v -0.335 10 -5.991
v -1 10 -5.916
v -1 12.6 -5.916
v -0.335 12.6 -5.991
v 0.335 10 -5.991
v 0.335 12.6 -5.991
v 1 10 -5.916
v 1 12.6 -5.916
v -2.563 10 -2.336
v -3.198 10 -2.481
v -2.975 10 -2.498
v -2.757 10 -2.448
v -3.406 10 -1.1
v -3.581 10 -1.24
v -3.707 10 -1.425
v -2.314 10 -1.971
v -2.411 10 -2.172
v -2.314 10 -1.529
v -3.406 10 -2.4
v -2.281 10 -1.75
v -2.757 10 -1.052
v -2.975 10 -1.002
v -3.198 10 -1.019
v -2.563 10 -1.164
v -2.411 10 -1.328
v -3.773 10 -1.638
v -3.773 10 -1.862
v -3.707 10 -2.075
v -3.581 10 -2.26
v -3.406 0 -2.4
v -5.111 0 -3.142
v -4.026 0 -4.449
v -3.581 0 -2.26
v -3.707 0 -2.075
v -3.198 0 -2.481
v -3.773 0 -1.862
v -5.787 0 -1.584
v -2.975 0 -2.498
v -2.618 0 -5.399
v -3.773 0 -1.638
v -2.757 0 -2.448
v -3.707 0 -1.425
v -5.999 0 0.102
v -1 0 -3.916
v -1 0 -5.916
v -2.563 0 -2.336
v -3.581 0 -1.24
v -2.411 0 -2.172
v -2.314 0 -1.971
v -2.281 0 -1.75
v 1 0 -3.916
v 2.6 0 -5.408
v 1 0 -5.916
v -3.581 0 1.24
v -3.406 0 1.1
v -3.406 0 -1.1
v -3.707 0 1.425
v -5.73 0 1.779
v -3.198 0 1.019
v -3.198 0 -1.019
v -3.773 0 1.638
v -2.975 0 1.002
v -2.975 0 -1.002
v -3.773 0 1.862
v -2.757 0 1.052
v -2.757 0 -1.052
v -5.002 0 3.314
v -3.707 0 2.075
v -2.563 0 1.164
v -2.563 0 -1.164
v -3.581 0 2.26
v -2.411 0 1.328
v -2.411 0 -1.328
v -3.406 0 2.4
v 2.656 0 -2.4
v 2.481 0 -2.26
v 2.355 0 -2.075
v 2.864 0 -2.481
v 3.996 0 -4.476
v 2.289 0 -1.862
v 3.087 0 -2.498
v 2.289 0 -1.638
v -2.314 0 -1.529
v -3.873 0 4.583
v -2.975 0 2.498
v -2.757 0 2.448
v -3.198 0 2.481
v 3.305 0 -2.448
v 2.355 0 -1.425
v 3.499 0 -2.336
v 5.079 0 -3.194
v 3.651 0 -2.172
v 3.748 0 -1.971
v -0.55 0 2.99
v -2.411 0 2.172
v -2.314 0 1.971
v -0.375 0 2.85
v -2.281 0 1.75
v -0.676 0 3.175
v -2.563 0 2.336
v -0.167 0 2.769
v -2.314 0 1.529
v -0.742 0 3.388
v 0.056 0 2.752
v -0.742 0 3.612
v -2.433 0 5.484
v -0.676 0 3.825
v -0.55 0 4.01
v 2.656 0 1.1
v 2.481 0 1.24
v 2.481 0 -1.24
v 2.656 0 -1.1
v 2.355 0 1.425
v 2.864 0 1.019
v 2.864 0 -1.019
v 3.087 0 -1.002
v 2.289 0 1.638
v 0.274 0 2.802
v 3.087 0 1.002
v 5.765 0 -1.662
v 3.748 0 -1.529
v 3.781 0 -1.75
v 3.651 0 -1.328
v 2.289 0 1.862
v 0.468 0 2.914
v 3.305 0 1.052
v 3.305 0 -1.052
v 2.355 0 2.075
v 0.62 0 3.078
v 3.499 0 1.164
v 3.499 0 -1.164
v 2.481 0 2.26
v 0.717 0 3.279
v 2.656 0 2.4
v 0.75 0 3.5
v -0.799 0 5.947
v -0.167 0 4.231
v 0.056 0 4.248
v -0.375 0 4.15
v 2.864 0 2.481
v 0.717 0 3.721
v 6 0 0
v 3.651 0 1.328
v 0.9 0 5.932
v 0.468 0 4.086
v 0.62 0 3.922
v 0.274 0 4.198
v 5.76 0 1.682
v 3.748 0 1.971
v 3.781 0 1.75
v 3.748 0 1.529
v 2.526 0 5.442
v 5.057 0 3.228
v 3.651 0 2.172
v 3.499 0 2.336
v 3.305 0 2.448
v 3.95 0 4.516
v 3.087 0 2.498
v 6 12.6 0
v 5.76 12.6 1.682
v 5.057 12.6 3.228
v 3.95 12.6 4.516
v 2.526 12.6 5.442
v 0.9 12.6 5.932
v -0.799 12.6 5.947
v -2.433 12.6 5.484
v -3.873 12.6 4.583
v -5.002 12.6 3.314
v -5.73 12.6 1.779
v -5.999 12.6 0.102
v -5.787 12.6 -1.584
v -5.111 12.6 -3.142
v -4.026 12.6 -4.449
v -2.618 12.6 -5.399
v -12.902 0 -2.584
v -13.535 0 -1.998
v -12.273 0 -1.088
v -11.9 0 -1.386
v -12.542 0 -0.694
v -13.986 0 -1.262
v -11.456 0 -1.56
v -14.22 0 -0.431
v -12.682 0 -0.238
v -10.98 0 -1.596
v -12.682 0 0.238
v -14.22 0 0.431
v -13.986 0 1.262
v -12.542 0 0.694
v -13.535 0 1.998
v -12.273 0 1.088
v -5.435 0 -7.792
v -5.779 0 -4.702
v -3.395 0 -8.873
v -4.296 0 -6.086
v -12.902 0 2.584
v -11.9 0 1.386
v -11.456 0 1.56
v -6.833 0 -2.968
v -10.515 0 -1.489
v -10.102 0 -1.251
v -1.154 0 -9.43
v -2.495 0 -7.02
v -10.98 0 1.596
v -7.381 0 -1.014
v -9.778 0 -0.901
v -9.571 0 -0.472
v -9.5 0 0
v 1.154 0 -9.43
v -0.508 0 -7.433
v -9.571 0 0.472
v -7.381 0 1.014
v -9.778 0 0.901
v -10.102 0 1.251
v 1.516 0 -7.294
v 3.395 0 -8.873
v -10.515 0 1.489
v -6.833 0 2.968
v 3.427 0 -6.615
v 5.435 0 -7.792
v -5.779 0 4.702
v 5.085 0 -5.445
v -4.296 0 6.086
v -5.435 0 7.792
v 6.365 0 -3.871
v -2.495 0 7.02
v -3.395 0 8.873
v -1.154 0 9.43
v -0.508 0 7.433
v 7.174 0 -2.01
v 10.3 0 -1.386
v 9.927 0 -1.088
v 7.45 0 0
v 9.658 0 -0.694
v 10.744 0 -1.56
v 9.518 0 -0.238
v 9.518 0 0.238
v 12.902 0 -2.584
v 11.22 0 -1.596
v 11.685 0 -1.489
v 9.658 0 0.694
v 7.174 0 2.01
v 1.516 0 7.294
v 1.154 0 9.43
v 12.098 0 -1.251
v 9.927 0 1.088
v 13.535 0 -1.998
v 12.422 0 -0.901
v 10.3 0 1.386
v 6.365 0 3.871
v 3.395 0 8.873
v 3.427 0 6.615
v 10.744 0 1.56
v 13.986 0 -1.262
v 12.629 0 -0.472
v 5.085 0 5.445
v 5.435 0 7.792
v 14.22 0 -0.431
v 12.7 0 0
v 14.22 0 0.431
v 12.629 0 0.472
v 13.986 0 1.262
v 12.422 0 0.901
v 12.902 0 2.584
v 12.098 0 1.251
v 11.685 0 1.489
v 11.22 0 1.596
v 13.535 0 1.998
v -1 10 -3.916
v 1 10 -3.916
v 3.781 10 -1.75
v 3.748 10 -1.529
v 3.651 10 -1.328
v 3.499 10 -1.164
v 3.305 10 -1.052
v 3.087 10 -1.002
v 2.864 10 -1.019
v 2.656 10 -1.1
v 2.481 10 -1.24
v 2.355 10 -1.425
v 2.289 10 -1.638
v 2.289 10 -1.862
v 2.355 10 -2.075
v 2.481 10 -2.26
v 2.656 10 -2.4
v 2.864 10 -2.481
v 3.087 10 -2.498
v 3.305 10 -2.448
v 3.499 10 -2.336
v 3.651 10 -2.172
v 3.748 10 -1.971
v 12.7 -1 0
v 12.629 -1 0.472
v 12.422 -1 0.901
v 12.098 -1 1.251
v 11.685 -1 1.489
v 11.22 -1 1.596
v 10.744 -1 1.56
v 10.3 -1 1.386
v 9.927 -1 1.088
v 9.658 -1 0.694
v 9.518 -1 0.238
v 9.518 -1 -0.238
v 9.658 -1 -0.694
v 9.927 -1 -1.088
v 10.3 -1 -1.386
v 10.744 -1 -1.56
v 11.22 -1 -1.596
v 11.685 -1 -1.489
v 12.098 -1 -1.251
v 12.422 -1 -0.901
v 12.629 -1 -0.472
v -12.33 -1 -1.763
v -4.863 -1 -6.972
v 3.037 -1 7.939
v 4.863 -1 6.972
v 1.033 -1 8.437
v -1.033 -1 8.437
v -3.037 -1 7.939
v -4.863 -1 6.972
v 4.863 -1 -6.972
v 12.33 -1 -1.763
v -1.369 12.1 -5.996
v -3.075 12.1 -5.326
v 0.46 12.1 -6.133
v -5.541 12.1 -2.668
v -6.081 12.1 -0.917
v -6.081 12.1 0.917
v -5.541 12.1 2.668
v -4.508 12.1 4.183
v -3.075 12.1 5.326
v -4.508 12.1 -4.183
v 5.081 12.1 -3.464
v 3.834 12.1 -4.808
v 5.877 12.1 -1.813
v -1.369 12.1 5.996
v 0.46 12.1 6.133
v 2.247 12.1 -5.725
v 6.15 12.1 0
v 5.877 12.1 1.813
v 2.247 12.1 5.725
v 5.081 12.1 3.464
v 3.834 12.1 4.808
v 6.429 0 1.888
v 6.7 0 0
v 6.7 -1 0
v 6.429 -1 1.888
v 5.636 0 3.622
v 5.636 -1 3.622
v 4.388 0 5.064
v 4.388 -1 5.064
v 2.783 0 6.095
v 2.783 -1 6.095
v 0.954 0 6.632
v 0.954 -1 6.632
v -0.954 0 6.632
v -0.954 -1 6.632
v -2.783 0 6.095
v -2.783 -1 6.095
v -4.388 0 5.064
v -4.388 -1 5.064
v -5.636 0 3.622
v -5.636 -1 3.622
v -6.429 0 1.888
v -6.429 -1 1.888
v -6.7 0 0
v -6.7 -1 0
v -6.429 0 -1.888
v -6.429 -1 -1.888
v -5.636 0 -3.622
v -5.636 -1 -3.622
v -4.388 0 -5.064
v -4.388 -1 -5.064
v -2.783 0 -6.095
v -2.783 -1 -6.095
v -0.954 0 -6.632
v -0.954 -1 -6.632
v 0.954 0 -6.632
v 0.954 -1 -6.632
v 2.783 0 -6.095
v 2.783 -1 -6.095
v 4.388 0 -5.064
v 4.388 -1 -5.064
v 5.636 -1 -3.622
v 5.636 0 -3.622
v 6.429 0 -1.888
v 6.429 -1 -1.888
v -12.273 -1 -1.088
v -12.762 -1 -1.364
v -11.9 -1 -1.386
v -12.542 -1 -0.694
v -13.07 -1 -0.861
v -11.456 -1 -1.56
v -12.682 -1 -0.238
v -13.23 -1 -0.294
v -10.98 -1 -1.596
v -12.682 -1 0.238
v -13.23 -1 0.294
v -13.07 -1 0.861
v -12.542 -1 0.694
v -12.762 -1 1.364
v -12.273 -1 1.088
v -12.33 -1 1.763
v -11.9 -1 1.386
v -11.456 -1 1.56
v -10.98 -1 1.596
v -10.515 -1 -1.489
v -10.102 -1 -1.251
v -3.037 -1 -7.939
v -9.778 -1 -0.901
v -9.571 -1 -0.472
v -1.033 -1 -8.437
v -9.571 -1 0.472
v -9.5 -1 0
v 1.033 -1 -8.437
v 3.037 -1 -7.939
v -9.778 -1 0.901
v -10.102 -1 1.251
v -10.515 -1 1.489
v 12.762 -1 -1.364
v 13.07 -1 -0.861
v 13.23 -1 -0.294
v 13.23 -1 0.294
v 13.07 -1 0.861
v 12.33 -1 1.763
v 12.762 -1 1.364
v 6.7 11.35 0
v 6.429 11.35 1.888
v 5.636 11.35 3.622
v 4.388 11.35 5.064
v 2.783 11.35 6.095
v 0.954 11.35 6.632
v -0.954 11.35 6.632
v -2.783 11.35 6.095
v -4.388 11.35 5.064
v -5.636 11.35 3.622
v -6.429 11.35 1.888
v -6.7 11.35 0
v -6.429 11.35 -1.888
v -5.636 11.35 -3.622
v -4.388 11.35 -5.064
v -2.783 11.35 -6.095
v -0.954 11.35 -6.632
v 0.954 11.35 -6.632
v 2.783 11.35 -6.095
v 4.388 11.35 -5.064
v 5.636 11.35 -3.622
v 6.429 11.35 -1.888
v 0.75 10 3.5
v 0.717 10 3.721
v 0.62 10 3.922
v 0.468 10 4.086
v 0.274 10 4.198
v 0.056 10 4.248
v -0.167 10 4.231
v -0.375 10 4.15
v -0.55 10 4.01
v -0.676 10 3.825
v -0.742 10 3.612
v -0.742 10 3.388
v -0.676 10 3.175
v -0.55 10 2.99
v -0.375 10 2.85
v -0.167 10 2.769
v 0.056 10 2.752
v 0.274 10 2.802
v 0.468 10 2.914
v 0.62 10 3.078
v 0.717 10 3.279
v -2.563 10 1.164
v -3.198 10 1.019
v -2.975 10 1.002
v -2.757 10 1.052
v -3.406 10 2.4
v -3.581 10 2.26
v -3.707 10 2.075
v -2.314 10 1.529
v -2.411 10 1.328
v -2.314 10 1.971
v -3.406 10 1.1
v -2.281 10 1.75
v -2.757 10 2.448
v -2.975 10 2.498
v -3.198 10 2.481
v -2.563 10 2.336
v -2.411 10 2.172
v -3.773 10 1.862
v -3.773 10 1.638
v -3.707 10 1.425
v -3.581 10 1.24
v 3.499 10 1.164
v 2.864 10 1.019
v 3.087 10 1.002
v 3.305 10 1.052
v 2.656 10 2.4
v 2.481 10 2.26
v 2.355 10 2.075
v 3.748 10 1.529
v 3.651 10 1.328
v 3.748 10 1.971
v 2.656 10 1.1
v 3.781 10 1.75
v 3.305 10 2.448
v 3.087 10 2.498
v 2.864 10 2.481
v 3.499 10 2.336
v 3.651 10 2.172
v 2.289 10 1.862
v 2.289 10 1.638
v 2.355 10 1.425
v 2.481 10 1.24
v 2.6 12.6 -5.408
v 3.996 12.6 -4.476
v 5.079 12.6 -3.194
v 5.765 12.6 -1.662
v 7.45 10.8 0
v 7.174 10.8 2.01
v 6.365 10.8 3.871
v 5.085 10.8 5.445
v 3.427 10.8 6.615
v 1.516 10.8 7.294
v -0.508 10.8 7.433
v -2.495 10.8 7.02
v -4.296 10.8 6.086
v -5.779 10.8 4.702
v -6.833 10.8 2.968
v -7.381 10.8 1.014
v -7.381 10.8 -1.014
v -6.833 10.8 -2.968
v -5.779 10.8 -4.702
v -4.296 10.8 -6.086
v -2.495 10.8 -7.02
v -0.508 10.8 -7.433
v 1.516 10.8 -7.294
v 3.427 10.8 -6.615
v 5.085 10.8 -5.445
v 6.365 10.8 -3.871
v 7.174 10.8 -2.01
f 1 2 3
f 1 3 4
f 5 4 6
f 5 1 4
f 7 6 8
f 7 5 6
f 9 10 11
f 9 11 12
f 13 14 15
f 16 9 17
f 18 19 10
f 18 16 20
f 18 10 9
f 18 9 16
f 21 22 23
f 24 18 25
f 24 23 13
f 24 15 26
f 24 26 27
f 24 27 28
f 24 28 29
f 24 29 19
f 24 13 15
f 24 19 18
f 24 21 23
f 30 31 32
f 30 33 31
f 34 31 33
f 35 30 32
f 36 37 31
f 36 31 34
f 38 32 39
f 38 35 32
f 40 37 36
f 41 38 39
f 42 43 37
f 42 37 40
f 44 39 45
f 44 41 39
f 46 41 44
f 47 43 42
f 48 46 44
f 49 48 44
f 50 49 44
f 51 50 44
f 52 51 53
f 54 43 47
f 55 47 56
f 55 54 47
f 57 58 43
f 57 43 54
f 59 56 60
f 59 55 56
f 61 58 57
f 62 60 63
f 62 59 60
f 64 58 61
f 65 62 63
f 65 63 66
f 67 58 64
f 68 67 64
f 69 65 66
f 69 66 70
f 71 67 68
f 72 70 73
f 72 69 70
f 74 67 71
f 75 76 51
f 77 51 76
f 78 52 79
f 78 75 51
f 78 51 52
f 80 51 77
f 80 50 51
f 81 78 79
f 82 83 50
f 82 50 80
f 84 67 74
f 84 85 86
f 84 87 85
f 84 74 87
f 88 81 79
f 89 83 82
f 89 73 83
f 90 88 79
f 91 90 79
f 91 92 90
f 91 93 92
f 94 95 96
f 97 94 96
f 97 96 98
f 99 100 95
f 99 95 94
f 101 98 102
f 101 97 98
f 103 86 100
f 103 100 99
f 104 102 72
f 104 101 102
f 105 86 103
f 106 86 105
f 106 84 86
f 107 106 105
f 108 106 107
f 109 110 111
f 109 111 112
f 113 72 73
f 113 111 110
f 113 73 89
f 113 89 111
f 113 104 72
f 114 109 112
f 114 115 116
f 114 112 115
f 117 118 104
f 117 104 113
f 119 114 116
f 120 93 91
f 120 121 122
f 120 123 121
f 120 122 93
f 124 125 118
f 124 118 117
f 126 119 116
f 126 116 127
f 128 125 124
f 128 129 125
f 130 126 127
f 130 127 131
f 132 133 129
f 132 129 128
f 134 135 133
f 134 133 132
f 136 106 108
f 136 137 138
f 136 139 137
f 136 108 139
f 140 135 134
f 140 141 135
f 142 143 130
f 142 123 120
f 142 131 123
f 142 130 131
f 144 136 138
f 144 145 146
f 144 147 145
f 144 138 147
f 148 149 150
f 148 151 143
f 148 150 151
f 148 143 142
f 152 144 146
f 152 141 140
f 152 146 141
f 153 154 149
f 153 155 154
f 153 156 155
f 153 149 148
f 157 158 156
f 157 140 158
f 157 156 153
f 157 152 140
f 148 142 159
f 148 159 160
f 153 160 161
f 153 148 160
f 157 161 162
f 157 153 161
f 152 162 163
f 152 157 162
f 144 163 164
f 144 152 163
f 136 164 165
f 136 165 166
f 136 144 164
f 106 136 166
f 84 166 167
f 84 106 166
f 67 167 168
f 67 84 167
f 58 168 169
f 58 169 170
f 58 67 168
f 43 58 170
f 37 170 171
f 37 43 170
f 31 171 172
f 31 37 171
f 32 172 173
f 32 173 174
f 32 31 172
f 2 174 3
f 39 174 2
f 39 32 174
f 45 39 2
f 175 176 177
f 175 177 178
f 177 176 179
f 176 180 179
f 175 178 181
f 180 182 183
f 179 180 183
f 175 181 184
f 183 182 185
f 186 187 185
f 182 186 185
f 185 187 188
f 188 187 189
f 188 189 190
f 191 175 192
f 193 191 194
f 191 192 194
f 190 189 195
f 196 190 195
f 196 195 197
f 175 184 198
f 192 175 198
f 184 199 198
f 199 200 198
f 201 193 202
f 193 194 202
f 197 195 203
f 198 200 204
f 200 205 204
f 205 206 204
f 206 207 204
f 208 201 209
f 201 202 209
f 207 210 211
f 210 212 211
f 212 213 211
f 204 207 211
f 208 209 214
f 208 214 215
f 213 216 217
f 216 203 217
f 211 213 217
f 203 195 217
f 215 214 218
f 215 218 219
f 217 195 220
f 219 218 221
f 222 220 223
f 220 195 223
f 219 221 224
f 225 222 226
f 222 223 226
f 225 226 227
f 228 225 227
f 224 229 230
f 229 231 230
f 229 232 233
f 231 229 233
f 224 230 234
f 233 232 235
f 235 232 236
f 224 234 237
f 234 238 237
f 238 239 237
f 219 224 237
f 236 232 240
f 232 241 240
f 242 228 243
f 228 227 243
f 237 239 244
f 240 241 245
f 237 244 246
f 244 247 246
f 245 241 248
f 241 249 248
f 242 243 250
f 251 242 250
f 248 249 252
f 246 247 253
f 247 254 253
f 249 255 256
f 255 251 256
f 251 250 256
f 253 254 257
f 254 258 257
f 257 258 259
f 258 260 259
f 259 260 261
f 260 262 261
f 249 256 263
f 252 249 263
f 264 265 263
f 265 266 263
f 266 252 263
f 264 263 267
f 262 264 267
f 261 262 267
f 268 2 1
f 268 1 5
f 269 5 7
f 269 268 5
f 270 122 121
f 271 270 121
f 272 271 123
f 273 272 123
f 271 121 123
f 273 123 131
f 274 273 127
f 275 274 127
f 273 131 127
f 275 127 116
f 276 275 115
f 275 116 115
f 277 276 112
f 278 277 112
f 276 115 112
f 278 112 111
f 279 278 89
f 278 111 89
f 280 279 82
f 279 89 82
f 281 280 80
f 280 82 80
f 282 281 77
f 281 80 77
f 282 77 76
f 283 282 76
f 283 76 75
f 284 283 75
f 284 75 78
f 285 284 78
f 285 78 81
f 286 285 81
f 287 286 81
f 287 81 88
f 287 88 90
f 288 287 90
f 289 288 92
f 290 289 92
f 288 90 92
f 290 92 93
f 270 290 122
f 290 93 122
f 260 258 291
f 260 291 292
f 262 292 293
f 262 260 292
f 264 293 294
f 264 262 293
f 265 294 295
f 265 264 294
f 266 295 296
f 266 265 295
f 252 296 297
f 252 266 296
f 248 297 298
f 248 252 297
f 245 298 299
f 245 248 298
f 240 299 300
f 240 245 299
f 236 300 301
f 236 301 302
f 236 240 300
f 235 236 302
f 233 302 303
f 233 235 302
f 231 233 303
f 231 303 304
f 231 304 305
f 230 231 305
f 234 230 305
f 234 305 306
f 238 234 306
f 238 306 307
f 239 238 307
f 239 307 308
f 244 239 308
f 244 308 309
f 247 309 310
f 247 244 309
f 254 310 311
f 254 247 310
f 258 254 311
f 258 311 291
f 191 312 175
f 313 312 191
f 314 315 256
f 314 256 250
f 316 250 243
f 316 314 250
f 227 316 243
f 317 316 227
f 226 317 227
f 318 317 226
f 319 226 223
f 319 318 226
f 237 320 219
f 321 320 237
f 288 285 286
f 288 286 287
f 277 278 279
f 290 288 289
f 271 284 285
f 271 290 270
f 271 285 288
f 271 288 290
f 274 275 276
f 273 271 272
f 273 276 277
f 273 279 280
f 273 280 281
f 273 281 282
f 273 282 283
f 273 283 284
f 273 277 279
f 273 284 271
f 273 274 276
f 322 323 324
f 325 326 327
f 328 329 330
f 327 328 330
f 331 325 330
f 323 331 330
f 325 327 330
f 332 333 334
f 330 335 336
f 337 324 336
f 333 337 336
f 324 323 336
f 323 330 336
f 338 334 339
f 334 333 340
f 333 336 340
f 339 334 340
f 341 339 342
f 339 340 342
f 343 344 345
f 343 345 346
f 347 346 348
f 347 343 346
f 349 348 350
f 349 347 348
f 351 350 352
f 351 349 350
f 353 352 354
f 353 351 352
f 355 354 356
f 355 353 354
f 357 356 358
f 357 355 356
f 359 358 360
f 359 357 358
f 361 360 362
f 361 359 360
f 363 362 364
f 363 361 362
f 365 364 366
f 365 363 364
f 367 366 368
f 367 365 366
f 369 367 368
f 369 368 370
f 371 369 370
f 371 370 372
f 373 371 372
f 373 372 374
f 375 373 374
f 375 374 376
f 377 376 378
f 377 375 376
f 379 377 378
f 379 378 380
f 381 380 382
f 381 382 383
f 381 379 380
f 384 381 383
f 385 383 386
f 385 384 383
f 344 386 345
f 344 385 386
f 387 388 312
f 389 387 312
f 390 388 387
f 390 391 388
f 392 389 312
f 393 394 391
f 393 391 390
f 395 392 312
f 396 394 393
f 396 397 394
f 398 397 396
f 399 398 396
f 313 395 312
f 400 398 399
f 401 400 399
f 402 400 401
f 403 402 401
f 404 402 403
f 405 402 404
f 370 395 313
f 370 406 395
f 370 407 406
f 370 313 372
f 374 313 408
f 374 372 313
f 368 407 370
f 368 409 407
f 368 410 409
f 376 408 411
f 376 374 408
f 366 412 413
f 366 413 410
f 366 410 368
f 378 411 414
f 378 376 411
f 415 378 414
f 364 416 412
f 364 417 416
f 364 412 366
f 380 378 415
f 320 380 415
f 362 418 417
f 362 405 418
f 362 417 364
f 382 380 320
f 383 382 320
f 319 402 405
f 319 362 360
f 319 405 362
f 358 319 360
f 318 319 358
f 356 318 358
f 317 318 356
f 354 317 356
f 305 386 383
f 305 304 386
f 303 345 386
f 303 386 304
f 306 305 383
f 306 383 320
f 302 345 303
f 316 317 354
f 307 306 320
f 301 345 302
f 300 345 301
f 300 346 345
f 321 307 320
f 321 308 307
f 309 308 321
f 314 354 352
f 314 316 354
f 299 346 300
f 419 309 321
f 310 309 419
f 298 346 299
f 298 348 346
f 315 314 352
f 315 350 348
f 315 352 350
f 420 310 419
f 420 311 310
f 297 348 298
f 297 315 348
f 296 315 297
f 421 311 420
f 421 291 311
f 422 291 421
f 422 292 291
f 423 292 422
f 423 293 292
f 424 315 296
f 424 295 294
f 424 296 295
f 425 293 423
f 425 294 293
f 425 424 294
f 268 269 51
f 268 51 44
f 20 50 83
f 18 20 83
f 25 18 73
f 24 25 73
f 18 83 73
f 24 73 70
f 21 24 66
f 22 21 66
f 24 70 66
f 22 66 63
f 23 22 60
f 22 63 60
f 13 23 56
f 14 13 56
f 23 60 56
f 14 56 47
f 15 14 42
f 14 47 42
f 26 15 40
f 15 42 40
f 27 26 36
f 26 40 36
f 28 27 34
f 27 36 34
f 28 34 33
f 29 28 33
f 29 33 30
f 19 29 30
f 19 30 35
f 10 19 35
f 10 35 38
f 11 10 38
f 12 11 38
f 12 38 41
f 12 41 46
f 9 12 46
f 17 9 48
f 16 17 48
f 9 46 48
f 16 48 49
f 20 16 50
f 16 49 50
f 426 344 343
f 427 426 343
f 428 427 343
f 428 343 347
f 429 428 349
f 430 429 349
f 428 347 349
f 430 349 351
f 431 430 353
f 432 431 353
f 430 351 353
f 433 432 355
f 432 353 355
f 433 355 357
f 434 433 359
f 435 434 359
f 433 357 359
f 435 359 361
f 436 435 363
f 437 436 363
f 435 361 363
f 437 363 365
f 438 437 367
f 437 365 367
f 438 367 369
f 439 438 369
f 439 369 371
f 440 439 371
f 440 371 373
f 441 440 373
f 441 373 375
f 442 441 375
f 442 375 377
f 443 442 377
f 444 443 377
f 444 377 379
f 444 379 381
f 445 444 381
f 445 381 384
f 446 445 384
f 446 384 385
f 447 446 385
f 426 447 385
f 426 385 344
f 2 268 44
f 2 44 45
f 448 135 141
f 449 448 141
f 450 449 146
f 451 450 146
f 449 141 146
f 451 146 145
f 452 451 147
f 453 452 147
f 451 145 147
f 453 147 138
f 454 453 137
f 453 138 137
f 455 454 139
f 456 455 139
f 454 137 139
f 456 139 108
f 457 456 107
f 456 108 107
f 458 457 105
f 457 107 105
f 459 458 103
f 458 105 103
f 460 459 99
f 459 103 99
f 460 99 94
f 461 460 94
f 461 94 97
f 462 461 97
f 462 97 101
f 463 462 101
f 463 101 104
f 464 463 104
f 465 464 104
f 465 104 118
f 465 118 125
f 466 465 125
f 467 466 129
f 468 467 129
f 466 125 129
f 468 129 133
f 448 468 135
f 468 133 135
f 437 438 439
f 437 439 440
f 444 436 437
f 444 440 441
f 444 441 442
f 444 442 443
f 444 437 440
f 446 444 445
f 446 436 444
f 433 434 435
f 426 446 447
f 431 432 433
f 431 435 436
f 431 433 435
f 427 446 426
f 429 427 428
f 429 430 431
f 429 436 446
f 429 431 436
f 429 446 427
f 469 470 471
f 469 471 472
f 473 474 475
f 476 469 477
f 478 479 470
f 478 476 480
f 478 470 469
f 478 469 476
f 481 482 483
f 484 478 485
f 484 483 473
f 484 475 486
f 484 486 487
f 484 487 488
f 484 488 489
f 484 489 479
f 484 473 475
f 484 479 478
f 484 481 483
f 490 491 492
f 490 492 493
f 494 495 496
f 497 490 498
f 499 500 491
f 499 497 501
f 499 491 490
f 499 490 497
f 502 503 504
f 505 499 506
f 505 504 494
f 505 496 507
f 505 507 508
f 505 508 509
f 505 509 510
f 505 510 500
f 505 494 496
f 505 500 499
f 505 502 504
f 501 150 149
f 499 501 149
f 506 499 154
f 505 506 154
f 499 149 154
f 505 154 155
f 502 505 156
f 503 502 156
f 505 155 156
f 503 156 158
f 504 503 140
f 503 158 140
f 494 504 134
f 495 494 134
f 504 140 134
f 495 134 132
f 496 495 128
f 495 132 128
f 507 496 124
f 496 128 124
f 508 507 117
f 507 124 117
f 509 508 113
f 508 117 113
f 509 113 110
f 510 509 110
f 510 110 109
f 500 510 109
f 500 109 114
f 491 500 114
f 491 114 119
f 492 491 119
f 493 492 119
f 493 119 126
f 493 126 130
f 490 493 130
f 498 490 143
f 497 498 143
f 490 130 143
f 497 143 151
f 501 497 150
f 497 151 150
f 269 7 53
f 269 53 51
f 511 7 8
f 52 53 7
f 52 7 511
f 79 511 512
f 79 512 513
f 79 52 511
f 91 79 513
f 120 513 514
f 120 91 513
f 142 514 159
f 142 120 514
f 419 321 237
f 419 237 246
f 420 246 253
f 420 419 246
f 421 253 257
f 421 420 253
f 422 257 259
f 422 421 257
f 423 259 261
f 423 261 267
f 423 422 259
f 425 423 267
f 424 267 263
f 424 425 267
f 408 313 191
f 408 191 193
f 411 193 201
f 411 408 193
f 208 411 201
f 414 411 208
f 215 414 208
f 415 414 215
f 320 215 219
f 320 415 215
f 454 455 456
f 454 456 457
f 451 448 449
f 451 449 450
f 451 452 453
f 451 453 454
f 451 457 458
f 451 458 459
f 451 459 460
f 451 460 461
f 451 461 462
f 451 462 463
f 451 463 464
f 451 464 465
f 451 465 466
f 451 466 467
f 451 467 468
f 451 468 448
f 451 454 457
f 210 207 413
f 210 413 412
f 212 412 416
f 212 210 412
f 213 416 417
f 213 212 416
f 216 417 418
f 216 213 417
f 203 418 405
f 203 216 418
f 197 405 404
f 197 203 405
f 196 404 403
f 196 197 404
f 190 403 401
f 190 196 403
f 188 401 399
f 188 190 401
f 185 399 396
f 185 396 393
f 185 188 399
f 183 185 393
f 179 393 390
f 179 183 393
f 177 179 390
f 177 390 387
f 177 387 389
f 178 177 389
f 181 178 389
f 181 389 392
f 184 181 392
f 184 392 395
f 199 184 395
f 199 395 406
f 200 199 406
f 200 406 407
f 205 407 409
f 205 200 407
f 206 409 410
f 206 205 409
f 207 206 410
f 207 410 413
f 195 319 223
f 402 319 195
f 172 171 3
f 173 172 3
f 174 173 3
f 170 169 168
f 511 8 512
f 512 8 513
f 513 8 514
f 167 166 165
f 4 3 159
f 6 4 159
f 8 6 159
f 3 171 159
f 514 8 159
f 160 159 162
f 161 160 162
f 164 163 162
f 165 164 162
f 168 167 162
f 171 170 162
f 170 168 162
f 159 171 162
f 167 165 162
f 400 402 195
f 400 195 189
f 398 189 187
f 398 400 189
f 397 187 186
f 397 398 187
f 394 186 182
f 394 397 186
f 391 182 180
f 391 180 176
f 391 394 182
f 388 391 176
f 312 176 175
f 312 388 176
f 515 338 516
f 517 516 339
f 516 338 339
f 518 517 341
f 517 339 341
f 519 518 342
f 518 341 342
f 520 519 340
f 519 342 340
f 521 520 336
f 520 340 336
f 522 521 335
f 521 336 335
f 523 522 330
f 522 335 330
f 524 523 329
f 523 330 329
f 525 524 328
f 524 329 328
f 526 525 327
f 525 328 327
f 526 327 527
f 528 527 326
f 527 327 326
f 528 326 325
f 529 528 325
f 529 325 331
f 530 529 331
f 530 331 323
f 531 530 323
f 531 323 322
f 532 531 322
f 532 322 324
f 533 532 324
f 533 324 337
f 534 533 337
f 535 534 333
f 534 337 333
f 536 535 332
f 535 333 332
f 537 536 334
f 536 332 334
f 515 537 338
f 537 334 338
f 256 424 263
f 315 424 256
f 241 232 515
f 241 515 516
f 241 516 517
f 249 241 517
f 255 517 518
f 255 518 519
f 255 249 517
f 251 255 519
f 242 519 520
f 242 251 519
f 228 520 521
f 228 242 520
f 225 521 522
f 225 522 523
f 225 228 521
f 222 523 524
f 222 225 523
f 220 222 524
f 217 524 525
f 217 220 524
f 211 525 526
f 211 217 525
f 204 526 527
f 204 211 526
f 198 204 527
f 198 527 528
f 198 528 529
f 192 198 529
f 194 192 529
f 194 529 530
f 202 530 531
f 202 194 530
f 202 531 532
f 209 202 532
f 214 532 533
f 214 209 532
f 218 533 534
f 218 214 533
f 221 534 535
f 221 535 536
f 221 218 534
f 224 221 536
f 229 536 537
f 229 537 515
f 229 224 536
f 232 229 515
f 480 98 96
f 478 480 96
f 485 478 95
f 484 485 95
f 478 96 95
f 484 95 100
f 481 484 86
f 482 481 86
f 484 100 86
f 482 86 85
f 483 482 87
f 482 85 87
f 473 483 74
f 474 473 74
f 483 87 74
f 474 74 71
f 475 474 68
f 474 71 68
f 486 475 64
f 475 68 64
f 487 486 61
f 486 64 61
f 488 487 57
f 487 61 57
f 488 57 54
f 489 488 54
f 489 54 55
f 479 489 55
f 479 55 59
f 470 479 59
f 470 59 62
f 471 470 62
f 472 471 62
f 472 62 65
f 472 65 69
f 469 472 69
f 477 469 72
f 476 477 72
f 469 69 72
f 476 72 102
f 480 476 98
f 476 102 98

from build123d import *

# Parameters (mm, degrees)
F0_R     = 1.6
F0_R_2   = 7.45
F0_R_3   = 6.7
F1_DEPTH = 1
F2_SIZE  = 0.99999
F0_R_4   = 0.75
F3_DEPTH = 12.1
F4_T     = 0.75
F5_DEPTH = 12.6
F6_DEPTH = 10
F7_SIZE  = 1.3


# Not quite as in the source:
# - a fillet or chamfer is up to 0.001 mm smaller than in the source, because OpenCascade refuses the exact size
# - a shell that OpenCascade refuses in one call is made with other operations: the cavity is built on its own and cut out
# - a feature names something its author has since deleted; it is built from what else it names


with BuildPart() as f1:
    # F0 (on Front) → F1 (new body)
    with BuildSketch(Plane.XZ):
        with BuildLine():
            Line((-5.4346846847, 7.7919318771), (-12.902027027, 2.5836405698))
            ThreePointArc((-12.902027027, 2.5836405698), (-14.25, 0), (-12.902027027, -2.5836405698))
            Line((-12.902027027, -2.5836405698), (-5.4346846847, -7.7919318771))
            ThreePointArc((-5.4346846847, -7.7919318771), (0, -9.5), (5.4346846847, -7.7919318771))
            Line((5.4346846847, -7.7919318771), (12.902027027, -2.5836405698))
            ThreePointArc((12.902027027, -2.5836405698), (14.25, 0), (12.902027027, 2.5836405698))
            Line((12.902027027, 2.5836405698), (5.4346846847, 7.7919318771))
            ThreePointArc((5.4346846847, 7.7919318771), (0, 9.5), (-5.4346846847, 7.7919318771))
        make_face()
        with Locations((-11.1, 0)):
            Circle(F0_R, mode=Mode.SUBTRACT)
        Circle(F0_R_2, mode=Mode.SUBTRACT)
        with Locations((11.1, 0)):
            Circle(F0_R, mode=Mode.SUBTRACT)
        Circle(F0_R_2)
        Circle(F0_R_3, mode=Mode.SUBTRACT)
    extrude(amount=F1_DEPTH)

    # F2 (size 1 in the source; OpenCascade refuses exactly that, so slightly less here)
    f2_edges = [f1.edges().sort_by_distance(p)[0] for p in [
        (-9.168356, -1, 5.187786),
        (0, -1, 9.5),
        (-14.25, -1, 0),
        (-9.168356, -1, -5.187786),
        (0, -1, -9.5),
        (9.168356, -1, -5.187786),
        (14.25, -1, 0),
        (9.168356, -1, 5.187786),
    ]]
    chamfer(f2_edges, length=F2_SIZE)

    # F0 (on Front) → F3 (join)
    with BuildSketch(Plane.XZ):
        Circle(F0_R_2)
        Circle(F0_R_3, mode=Mode.SUBTRACT)
        Circle(F0_R_3)
        with BuildLine():
            ThreePointArc((-1, -5.9160797831), (-3.8729833462, 4.582575695), (6, 0))
            ThreePointArc((6, 0), (4.582575695, -3.8729833462), (1, -5.9160797831))
            Line((1, -5.9160797831), (1, -6.3300160691))
            Line((1, -6.3300160691), (-1, -6.3300160691))
            Line((-1, -6.3300160691), (-1, -5.9160797831))
        make_face(mode=Mode.SUBTRACT)
        with BuildLine():
            ThreePointArc((1, -5.9160797831), (4.582575695, -3.8729833462), (6, 0))
            ThreePointArc((6, 0), (-3.8729833462, 4.582575695), (-1, -5.9160797831))
            Line((-1, -5.9160797831), (-1, -3.9160797831))
            Line((-1, -3.9160797831), (0, -3.9160797831))
            Line((0, -3.9160797831), (1, -3.9160797831))
            Line((1, -3.9160797831), (1, -5.9160797831))
        make_face()
        with Locations((-3.0310889132, -1.75)):
            Circle(F0_R_4, mode=Mode.SUBTRACT)
        with Locations((3.0310889132, -1.75)):
            Circle(F0_R_4, mode=Mode.SUBTRACT)
        with Locations((-3.0310889132, 1.75)):
            Circle(F0_R_4, mode=Mode.SUBTRACT)
        with Locations((3.0310889132, 1.75)):
            Circle(F0_R_4, mode=Mode.SUBTRACT)
        with Locations((0, 3.5)):
            Circle(F0_R_4, mode=Mode.SUBTRACT)
        with Locations((-3.0310889132, -1.75)):
            Circle(F0_R_4)
        with BuildLine():
            Line((-1, -3.9160797831), (-1, -5.9160797831))
            ThreePointArc((-1, -5.9160797831), (0, -6), (1, -5.9160797831))
            Line((1, -5.9160797831), (1, -3.9160797831))
            Line((1, -3.9160797831), (0, -3.9160797831))
            Line((0, -3.9160797831), (-1, -3.9160797831))
        make_face()
        with BuildLine():
            ThreePointArc((1, -5.9160797831), (0, -6), (-1, -5.9160797831))
            Line((-1, -5.9160797831), (-1, -6.3300160691))
            Line((-1, -6.3300160691), (1, -6.3300160691))
            Line((1, -6.3300160691), (1, -5.9160797831))
        make_face()
        with Locations((-3.0310889132, 1.75)):
            Circle(F0_R_4)
        with Locations((0, 3.5)):
            Circle(F0_R_4)
        with Locations((3.0310889132, 1.75)):
            Circle(F0_R_4)
        with Locations((3.0310889132, -1.75)):
            Circle(F0_R_4)
    extrude(amount=-F3_DEPTH)

    # F4: shell of thickness 0.75, made by hand


with BuildPart() as f4_core1:
    # F4_t2: copy of F1
    add(f1.part)

    # the walls: a layer under each face that stays
    f4_faces = [f4_core1.faces().sort_by_distance(p)[0] for p in [
        (0, -5e-06, 9.5),
        (9.1683558559, -5e-06, 5.1877862235),
        (0, -0.500005, 9.000005),
        (-12.2142857143, 0, -2.7142857143),
        (-9.1683558559, -5e-06, 5.1877862235),
        (14.25, -5e-06, 0),
        (8.8823226802, -0.500005, 4.7776886467),
        (-8.83334, -1, 0),
        (-8.8823226802, -0.500005, 4.7776886467),
        (-14.25, -5e-06, 0),
        (9.1683558559, -5e-06, -5.1877862235),
        (-9.1683558559, -5e-06, -5.1877862235),
        (0, -5e-06, -9.5),
        (-12.7, -0.5, 0),
        (-7.45, 6.05, 0),
        (9.5, -0.5, 0),
        (13.750005, -0.500005, 0),
        (-13.750005, -0.500005, 0),
        (-8.8823226802, -0.500005, -4.7776886467),
        (0, -0.500005, -9.000005),
        (8.8823226802, -0.500005, -4.7776886467),
        (-6.7, -0.5, 0),
        (0, 12.1, 0),
    ]]
    thicken(f4_faces, amount=-F4_T, mode=Mode.SUBTRACT)

    # F4_s3 → F4_t4 (revolve, cut)
    with BuildSketch(Plane.XY):
        Polygon((7.4575, 0.0075), (7.45, -0.75), (6.7, -0.75), (6.7, 0), align=None)
    revolve(axis=Axis((0, 0, 0), (0, -1, 0)), mode=Mode.SUBTRACT)


with BuildPart() as f1_1:
    add(f1.part)

    # what is left inside the walls is the cavity
    f4_cavity = [f4_core1.part.solids().sort_by_distance(p)[0] for p in [
        (-6.6925, 7.566667, 0),
    ]]
    add(f4_cavity, mode=Mode.SUBTRACT)

    # F7
    f7_edges = [f1_1.edges().sort_by_distance(p)[0] for p in [
        (-7.45, 12.1, 0),
    ]]
    chamfer(f7_edges, length=F7_SIZE)


with BuildPart() as f5:
    # F0 (on Front) → F5 (new body)
    with BuildSketch(Plane.XZ):
        with BuildLine():
            ThreePointArc((1, -5.9160797831), (4.582575695, -3.8729833462), (6, 0))
            ThreePointArc((6, 0), (-3.8729833462, 4.582575695), (-1, -5.9160797831))
            Line((-1, -5.9160797831), (-1, -3.9160797831))
            Line((-1, -3.9160797831), (0, -3.9160797831))
            Line((0, -3.9160797831), (1, -3.9160797831))
            Line((1, -3.9160797831), (1, -5.9160797831))
        make_face()
        with Locations((-3.0310889132, -1.75)):
            Circle(F0_R_4, mode=Mode.SUBTRACT)
        with Locations((3.0310889132, -1.75)):
            Circle(F0_R_4, mode=Mode.SUBTRACT)
        with Locations((-3.0310889132, 1.75)):
            Circle(F0_R_4, mode=Mode.SUBTRACT)
        with Locations((3.0310889132, 1.75)):
            Circle(F0_R_4, mode=Mode.SUBTRACT)
        with Locations((0, 3.5)):
            Circle(F0_R_4, mode=Mode.SUBTRACT)
        with Locations((-3.0310889132, -1.75)):
            Circle(F0_R_4)
        with BuildLine():
            Line((-1, -3.9160797831), (-1, -5.9160797831))
            ThreePointArc((-1, -5.9160797831), (0, -6), (1, -5.9160797831))
            Line((1, -5.9160797831), (1, -3.9160797831))
            Line((1, -3.9160797831), (0, -3.9160797831))
            Line((0, -3.9160797831), (-1, -3.9160797831))
        make_face()
        with Locations((-3.0310889132, 1.75)):
            Circle(F0_R_4)
        with Locations((0, 3.5)):
            Circle(F0_R_4)
        with Locations((3.0310889132, 1.75)):
            Circle(F0_R_4)
        with Locations((3.0310889132, -1.75)):
            Circle(F0_R_4)
    extrude(amount=-F5_DEPTH)

    # F0 (on Front) → F6 (cut)
    with BuildSketch(Plane.XZ):
        with Locations((-3.0310889132, -1.75)):
            Circle(F0_R_4)
        with BuildLine():
            Line((-1, -3.9160797831), (-1, -5.9160797831))
            ThreePointArc((-1, -5.9160797831), (0, -6), (1, -5.9160797831))
            Line((1, -5.9160797831), (1, -3.9160797831))
            Line((1, -3.9160797831), (0, -3.9160797831))
            Line((0, -3.9160797831), (-1, -3.9160797831))
        make_face()
        with Locations((-3.0310889132, 1.75)):
            Circle(F0_R_4)
        with Locations((0, 3.5)):
            Circle(F0_R_4)
        with Locations((3.0310889132, 1.75)):
            Circle(F0_R_4)
        with Locations((3.0310889132, -1.75)):
            Circle(F0_R_4)
    extrude(amount=-F6_DEPTH, mode=Mode.SUBTRACT)


solid = Compound([f1_1.part, f5.part])
